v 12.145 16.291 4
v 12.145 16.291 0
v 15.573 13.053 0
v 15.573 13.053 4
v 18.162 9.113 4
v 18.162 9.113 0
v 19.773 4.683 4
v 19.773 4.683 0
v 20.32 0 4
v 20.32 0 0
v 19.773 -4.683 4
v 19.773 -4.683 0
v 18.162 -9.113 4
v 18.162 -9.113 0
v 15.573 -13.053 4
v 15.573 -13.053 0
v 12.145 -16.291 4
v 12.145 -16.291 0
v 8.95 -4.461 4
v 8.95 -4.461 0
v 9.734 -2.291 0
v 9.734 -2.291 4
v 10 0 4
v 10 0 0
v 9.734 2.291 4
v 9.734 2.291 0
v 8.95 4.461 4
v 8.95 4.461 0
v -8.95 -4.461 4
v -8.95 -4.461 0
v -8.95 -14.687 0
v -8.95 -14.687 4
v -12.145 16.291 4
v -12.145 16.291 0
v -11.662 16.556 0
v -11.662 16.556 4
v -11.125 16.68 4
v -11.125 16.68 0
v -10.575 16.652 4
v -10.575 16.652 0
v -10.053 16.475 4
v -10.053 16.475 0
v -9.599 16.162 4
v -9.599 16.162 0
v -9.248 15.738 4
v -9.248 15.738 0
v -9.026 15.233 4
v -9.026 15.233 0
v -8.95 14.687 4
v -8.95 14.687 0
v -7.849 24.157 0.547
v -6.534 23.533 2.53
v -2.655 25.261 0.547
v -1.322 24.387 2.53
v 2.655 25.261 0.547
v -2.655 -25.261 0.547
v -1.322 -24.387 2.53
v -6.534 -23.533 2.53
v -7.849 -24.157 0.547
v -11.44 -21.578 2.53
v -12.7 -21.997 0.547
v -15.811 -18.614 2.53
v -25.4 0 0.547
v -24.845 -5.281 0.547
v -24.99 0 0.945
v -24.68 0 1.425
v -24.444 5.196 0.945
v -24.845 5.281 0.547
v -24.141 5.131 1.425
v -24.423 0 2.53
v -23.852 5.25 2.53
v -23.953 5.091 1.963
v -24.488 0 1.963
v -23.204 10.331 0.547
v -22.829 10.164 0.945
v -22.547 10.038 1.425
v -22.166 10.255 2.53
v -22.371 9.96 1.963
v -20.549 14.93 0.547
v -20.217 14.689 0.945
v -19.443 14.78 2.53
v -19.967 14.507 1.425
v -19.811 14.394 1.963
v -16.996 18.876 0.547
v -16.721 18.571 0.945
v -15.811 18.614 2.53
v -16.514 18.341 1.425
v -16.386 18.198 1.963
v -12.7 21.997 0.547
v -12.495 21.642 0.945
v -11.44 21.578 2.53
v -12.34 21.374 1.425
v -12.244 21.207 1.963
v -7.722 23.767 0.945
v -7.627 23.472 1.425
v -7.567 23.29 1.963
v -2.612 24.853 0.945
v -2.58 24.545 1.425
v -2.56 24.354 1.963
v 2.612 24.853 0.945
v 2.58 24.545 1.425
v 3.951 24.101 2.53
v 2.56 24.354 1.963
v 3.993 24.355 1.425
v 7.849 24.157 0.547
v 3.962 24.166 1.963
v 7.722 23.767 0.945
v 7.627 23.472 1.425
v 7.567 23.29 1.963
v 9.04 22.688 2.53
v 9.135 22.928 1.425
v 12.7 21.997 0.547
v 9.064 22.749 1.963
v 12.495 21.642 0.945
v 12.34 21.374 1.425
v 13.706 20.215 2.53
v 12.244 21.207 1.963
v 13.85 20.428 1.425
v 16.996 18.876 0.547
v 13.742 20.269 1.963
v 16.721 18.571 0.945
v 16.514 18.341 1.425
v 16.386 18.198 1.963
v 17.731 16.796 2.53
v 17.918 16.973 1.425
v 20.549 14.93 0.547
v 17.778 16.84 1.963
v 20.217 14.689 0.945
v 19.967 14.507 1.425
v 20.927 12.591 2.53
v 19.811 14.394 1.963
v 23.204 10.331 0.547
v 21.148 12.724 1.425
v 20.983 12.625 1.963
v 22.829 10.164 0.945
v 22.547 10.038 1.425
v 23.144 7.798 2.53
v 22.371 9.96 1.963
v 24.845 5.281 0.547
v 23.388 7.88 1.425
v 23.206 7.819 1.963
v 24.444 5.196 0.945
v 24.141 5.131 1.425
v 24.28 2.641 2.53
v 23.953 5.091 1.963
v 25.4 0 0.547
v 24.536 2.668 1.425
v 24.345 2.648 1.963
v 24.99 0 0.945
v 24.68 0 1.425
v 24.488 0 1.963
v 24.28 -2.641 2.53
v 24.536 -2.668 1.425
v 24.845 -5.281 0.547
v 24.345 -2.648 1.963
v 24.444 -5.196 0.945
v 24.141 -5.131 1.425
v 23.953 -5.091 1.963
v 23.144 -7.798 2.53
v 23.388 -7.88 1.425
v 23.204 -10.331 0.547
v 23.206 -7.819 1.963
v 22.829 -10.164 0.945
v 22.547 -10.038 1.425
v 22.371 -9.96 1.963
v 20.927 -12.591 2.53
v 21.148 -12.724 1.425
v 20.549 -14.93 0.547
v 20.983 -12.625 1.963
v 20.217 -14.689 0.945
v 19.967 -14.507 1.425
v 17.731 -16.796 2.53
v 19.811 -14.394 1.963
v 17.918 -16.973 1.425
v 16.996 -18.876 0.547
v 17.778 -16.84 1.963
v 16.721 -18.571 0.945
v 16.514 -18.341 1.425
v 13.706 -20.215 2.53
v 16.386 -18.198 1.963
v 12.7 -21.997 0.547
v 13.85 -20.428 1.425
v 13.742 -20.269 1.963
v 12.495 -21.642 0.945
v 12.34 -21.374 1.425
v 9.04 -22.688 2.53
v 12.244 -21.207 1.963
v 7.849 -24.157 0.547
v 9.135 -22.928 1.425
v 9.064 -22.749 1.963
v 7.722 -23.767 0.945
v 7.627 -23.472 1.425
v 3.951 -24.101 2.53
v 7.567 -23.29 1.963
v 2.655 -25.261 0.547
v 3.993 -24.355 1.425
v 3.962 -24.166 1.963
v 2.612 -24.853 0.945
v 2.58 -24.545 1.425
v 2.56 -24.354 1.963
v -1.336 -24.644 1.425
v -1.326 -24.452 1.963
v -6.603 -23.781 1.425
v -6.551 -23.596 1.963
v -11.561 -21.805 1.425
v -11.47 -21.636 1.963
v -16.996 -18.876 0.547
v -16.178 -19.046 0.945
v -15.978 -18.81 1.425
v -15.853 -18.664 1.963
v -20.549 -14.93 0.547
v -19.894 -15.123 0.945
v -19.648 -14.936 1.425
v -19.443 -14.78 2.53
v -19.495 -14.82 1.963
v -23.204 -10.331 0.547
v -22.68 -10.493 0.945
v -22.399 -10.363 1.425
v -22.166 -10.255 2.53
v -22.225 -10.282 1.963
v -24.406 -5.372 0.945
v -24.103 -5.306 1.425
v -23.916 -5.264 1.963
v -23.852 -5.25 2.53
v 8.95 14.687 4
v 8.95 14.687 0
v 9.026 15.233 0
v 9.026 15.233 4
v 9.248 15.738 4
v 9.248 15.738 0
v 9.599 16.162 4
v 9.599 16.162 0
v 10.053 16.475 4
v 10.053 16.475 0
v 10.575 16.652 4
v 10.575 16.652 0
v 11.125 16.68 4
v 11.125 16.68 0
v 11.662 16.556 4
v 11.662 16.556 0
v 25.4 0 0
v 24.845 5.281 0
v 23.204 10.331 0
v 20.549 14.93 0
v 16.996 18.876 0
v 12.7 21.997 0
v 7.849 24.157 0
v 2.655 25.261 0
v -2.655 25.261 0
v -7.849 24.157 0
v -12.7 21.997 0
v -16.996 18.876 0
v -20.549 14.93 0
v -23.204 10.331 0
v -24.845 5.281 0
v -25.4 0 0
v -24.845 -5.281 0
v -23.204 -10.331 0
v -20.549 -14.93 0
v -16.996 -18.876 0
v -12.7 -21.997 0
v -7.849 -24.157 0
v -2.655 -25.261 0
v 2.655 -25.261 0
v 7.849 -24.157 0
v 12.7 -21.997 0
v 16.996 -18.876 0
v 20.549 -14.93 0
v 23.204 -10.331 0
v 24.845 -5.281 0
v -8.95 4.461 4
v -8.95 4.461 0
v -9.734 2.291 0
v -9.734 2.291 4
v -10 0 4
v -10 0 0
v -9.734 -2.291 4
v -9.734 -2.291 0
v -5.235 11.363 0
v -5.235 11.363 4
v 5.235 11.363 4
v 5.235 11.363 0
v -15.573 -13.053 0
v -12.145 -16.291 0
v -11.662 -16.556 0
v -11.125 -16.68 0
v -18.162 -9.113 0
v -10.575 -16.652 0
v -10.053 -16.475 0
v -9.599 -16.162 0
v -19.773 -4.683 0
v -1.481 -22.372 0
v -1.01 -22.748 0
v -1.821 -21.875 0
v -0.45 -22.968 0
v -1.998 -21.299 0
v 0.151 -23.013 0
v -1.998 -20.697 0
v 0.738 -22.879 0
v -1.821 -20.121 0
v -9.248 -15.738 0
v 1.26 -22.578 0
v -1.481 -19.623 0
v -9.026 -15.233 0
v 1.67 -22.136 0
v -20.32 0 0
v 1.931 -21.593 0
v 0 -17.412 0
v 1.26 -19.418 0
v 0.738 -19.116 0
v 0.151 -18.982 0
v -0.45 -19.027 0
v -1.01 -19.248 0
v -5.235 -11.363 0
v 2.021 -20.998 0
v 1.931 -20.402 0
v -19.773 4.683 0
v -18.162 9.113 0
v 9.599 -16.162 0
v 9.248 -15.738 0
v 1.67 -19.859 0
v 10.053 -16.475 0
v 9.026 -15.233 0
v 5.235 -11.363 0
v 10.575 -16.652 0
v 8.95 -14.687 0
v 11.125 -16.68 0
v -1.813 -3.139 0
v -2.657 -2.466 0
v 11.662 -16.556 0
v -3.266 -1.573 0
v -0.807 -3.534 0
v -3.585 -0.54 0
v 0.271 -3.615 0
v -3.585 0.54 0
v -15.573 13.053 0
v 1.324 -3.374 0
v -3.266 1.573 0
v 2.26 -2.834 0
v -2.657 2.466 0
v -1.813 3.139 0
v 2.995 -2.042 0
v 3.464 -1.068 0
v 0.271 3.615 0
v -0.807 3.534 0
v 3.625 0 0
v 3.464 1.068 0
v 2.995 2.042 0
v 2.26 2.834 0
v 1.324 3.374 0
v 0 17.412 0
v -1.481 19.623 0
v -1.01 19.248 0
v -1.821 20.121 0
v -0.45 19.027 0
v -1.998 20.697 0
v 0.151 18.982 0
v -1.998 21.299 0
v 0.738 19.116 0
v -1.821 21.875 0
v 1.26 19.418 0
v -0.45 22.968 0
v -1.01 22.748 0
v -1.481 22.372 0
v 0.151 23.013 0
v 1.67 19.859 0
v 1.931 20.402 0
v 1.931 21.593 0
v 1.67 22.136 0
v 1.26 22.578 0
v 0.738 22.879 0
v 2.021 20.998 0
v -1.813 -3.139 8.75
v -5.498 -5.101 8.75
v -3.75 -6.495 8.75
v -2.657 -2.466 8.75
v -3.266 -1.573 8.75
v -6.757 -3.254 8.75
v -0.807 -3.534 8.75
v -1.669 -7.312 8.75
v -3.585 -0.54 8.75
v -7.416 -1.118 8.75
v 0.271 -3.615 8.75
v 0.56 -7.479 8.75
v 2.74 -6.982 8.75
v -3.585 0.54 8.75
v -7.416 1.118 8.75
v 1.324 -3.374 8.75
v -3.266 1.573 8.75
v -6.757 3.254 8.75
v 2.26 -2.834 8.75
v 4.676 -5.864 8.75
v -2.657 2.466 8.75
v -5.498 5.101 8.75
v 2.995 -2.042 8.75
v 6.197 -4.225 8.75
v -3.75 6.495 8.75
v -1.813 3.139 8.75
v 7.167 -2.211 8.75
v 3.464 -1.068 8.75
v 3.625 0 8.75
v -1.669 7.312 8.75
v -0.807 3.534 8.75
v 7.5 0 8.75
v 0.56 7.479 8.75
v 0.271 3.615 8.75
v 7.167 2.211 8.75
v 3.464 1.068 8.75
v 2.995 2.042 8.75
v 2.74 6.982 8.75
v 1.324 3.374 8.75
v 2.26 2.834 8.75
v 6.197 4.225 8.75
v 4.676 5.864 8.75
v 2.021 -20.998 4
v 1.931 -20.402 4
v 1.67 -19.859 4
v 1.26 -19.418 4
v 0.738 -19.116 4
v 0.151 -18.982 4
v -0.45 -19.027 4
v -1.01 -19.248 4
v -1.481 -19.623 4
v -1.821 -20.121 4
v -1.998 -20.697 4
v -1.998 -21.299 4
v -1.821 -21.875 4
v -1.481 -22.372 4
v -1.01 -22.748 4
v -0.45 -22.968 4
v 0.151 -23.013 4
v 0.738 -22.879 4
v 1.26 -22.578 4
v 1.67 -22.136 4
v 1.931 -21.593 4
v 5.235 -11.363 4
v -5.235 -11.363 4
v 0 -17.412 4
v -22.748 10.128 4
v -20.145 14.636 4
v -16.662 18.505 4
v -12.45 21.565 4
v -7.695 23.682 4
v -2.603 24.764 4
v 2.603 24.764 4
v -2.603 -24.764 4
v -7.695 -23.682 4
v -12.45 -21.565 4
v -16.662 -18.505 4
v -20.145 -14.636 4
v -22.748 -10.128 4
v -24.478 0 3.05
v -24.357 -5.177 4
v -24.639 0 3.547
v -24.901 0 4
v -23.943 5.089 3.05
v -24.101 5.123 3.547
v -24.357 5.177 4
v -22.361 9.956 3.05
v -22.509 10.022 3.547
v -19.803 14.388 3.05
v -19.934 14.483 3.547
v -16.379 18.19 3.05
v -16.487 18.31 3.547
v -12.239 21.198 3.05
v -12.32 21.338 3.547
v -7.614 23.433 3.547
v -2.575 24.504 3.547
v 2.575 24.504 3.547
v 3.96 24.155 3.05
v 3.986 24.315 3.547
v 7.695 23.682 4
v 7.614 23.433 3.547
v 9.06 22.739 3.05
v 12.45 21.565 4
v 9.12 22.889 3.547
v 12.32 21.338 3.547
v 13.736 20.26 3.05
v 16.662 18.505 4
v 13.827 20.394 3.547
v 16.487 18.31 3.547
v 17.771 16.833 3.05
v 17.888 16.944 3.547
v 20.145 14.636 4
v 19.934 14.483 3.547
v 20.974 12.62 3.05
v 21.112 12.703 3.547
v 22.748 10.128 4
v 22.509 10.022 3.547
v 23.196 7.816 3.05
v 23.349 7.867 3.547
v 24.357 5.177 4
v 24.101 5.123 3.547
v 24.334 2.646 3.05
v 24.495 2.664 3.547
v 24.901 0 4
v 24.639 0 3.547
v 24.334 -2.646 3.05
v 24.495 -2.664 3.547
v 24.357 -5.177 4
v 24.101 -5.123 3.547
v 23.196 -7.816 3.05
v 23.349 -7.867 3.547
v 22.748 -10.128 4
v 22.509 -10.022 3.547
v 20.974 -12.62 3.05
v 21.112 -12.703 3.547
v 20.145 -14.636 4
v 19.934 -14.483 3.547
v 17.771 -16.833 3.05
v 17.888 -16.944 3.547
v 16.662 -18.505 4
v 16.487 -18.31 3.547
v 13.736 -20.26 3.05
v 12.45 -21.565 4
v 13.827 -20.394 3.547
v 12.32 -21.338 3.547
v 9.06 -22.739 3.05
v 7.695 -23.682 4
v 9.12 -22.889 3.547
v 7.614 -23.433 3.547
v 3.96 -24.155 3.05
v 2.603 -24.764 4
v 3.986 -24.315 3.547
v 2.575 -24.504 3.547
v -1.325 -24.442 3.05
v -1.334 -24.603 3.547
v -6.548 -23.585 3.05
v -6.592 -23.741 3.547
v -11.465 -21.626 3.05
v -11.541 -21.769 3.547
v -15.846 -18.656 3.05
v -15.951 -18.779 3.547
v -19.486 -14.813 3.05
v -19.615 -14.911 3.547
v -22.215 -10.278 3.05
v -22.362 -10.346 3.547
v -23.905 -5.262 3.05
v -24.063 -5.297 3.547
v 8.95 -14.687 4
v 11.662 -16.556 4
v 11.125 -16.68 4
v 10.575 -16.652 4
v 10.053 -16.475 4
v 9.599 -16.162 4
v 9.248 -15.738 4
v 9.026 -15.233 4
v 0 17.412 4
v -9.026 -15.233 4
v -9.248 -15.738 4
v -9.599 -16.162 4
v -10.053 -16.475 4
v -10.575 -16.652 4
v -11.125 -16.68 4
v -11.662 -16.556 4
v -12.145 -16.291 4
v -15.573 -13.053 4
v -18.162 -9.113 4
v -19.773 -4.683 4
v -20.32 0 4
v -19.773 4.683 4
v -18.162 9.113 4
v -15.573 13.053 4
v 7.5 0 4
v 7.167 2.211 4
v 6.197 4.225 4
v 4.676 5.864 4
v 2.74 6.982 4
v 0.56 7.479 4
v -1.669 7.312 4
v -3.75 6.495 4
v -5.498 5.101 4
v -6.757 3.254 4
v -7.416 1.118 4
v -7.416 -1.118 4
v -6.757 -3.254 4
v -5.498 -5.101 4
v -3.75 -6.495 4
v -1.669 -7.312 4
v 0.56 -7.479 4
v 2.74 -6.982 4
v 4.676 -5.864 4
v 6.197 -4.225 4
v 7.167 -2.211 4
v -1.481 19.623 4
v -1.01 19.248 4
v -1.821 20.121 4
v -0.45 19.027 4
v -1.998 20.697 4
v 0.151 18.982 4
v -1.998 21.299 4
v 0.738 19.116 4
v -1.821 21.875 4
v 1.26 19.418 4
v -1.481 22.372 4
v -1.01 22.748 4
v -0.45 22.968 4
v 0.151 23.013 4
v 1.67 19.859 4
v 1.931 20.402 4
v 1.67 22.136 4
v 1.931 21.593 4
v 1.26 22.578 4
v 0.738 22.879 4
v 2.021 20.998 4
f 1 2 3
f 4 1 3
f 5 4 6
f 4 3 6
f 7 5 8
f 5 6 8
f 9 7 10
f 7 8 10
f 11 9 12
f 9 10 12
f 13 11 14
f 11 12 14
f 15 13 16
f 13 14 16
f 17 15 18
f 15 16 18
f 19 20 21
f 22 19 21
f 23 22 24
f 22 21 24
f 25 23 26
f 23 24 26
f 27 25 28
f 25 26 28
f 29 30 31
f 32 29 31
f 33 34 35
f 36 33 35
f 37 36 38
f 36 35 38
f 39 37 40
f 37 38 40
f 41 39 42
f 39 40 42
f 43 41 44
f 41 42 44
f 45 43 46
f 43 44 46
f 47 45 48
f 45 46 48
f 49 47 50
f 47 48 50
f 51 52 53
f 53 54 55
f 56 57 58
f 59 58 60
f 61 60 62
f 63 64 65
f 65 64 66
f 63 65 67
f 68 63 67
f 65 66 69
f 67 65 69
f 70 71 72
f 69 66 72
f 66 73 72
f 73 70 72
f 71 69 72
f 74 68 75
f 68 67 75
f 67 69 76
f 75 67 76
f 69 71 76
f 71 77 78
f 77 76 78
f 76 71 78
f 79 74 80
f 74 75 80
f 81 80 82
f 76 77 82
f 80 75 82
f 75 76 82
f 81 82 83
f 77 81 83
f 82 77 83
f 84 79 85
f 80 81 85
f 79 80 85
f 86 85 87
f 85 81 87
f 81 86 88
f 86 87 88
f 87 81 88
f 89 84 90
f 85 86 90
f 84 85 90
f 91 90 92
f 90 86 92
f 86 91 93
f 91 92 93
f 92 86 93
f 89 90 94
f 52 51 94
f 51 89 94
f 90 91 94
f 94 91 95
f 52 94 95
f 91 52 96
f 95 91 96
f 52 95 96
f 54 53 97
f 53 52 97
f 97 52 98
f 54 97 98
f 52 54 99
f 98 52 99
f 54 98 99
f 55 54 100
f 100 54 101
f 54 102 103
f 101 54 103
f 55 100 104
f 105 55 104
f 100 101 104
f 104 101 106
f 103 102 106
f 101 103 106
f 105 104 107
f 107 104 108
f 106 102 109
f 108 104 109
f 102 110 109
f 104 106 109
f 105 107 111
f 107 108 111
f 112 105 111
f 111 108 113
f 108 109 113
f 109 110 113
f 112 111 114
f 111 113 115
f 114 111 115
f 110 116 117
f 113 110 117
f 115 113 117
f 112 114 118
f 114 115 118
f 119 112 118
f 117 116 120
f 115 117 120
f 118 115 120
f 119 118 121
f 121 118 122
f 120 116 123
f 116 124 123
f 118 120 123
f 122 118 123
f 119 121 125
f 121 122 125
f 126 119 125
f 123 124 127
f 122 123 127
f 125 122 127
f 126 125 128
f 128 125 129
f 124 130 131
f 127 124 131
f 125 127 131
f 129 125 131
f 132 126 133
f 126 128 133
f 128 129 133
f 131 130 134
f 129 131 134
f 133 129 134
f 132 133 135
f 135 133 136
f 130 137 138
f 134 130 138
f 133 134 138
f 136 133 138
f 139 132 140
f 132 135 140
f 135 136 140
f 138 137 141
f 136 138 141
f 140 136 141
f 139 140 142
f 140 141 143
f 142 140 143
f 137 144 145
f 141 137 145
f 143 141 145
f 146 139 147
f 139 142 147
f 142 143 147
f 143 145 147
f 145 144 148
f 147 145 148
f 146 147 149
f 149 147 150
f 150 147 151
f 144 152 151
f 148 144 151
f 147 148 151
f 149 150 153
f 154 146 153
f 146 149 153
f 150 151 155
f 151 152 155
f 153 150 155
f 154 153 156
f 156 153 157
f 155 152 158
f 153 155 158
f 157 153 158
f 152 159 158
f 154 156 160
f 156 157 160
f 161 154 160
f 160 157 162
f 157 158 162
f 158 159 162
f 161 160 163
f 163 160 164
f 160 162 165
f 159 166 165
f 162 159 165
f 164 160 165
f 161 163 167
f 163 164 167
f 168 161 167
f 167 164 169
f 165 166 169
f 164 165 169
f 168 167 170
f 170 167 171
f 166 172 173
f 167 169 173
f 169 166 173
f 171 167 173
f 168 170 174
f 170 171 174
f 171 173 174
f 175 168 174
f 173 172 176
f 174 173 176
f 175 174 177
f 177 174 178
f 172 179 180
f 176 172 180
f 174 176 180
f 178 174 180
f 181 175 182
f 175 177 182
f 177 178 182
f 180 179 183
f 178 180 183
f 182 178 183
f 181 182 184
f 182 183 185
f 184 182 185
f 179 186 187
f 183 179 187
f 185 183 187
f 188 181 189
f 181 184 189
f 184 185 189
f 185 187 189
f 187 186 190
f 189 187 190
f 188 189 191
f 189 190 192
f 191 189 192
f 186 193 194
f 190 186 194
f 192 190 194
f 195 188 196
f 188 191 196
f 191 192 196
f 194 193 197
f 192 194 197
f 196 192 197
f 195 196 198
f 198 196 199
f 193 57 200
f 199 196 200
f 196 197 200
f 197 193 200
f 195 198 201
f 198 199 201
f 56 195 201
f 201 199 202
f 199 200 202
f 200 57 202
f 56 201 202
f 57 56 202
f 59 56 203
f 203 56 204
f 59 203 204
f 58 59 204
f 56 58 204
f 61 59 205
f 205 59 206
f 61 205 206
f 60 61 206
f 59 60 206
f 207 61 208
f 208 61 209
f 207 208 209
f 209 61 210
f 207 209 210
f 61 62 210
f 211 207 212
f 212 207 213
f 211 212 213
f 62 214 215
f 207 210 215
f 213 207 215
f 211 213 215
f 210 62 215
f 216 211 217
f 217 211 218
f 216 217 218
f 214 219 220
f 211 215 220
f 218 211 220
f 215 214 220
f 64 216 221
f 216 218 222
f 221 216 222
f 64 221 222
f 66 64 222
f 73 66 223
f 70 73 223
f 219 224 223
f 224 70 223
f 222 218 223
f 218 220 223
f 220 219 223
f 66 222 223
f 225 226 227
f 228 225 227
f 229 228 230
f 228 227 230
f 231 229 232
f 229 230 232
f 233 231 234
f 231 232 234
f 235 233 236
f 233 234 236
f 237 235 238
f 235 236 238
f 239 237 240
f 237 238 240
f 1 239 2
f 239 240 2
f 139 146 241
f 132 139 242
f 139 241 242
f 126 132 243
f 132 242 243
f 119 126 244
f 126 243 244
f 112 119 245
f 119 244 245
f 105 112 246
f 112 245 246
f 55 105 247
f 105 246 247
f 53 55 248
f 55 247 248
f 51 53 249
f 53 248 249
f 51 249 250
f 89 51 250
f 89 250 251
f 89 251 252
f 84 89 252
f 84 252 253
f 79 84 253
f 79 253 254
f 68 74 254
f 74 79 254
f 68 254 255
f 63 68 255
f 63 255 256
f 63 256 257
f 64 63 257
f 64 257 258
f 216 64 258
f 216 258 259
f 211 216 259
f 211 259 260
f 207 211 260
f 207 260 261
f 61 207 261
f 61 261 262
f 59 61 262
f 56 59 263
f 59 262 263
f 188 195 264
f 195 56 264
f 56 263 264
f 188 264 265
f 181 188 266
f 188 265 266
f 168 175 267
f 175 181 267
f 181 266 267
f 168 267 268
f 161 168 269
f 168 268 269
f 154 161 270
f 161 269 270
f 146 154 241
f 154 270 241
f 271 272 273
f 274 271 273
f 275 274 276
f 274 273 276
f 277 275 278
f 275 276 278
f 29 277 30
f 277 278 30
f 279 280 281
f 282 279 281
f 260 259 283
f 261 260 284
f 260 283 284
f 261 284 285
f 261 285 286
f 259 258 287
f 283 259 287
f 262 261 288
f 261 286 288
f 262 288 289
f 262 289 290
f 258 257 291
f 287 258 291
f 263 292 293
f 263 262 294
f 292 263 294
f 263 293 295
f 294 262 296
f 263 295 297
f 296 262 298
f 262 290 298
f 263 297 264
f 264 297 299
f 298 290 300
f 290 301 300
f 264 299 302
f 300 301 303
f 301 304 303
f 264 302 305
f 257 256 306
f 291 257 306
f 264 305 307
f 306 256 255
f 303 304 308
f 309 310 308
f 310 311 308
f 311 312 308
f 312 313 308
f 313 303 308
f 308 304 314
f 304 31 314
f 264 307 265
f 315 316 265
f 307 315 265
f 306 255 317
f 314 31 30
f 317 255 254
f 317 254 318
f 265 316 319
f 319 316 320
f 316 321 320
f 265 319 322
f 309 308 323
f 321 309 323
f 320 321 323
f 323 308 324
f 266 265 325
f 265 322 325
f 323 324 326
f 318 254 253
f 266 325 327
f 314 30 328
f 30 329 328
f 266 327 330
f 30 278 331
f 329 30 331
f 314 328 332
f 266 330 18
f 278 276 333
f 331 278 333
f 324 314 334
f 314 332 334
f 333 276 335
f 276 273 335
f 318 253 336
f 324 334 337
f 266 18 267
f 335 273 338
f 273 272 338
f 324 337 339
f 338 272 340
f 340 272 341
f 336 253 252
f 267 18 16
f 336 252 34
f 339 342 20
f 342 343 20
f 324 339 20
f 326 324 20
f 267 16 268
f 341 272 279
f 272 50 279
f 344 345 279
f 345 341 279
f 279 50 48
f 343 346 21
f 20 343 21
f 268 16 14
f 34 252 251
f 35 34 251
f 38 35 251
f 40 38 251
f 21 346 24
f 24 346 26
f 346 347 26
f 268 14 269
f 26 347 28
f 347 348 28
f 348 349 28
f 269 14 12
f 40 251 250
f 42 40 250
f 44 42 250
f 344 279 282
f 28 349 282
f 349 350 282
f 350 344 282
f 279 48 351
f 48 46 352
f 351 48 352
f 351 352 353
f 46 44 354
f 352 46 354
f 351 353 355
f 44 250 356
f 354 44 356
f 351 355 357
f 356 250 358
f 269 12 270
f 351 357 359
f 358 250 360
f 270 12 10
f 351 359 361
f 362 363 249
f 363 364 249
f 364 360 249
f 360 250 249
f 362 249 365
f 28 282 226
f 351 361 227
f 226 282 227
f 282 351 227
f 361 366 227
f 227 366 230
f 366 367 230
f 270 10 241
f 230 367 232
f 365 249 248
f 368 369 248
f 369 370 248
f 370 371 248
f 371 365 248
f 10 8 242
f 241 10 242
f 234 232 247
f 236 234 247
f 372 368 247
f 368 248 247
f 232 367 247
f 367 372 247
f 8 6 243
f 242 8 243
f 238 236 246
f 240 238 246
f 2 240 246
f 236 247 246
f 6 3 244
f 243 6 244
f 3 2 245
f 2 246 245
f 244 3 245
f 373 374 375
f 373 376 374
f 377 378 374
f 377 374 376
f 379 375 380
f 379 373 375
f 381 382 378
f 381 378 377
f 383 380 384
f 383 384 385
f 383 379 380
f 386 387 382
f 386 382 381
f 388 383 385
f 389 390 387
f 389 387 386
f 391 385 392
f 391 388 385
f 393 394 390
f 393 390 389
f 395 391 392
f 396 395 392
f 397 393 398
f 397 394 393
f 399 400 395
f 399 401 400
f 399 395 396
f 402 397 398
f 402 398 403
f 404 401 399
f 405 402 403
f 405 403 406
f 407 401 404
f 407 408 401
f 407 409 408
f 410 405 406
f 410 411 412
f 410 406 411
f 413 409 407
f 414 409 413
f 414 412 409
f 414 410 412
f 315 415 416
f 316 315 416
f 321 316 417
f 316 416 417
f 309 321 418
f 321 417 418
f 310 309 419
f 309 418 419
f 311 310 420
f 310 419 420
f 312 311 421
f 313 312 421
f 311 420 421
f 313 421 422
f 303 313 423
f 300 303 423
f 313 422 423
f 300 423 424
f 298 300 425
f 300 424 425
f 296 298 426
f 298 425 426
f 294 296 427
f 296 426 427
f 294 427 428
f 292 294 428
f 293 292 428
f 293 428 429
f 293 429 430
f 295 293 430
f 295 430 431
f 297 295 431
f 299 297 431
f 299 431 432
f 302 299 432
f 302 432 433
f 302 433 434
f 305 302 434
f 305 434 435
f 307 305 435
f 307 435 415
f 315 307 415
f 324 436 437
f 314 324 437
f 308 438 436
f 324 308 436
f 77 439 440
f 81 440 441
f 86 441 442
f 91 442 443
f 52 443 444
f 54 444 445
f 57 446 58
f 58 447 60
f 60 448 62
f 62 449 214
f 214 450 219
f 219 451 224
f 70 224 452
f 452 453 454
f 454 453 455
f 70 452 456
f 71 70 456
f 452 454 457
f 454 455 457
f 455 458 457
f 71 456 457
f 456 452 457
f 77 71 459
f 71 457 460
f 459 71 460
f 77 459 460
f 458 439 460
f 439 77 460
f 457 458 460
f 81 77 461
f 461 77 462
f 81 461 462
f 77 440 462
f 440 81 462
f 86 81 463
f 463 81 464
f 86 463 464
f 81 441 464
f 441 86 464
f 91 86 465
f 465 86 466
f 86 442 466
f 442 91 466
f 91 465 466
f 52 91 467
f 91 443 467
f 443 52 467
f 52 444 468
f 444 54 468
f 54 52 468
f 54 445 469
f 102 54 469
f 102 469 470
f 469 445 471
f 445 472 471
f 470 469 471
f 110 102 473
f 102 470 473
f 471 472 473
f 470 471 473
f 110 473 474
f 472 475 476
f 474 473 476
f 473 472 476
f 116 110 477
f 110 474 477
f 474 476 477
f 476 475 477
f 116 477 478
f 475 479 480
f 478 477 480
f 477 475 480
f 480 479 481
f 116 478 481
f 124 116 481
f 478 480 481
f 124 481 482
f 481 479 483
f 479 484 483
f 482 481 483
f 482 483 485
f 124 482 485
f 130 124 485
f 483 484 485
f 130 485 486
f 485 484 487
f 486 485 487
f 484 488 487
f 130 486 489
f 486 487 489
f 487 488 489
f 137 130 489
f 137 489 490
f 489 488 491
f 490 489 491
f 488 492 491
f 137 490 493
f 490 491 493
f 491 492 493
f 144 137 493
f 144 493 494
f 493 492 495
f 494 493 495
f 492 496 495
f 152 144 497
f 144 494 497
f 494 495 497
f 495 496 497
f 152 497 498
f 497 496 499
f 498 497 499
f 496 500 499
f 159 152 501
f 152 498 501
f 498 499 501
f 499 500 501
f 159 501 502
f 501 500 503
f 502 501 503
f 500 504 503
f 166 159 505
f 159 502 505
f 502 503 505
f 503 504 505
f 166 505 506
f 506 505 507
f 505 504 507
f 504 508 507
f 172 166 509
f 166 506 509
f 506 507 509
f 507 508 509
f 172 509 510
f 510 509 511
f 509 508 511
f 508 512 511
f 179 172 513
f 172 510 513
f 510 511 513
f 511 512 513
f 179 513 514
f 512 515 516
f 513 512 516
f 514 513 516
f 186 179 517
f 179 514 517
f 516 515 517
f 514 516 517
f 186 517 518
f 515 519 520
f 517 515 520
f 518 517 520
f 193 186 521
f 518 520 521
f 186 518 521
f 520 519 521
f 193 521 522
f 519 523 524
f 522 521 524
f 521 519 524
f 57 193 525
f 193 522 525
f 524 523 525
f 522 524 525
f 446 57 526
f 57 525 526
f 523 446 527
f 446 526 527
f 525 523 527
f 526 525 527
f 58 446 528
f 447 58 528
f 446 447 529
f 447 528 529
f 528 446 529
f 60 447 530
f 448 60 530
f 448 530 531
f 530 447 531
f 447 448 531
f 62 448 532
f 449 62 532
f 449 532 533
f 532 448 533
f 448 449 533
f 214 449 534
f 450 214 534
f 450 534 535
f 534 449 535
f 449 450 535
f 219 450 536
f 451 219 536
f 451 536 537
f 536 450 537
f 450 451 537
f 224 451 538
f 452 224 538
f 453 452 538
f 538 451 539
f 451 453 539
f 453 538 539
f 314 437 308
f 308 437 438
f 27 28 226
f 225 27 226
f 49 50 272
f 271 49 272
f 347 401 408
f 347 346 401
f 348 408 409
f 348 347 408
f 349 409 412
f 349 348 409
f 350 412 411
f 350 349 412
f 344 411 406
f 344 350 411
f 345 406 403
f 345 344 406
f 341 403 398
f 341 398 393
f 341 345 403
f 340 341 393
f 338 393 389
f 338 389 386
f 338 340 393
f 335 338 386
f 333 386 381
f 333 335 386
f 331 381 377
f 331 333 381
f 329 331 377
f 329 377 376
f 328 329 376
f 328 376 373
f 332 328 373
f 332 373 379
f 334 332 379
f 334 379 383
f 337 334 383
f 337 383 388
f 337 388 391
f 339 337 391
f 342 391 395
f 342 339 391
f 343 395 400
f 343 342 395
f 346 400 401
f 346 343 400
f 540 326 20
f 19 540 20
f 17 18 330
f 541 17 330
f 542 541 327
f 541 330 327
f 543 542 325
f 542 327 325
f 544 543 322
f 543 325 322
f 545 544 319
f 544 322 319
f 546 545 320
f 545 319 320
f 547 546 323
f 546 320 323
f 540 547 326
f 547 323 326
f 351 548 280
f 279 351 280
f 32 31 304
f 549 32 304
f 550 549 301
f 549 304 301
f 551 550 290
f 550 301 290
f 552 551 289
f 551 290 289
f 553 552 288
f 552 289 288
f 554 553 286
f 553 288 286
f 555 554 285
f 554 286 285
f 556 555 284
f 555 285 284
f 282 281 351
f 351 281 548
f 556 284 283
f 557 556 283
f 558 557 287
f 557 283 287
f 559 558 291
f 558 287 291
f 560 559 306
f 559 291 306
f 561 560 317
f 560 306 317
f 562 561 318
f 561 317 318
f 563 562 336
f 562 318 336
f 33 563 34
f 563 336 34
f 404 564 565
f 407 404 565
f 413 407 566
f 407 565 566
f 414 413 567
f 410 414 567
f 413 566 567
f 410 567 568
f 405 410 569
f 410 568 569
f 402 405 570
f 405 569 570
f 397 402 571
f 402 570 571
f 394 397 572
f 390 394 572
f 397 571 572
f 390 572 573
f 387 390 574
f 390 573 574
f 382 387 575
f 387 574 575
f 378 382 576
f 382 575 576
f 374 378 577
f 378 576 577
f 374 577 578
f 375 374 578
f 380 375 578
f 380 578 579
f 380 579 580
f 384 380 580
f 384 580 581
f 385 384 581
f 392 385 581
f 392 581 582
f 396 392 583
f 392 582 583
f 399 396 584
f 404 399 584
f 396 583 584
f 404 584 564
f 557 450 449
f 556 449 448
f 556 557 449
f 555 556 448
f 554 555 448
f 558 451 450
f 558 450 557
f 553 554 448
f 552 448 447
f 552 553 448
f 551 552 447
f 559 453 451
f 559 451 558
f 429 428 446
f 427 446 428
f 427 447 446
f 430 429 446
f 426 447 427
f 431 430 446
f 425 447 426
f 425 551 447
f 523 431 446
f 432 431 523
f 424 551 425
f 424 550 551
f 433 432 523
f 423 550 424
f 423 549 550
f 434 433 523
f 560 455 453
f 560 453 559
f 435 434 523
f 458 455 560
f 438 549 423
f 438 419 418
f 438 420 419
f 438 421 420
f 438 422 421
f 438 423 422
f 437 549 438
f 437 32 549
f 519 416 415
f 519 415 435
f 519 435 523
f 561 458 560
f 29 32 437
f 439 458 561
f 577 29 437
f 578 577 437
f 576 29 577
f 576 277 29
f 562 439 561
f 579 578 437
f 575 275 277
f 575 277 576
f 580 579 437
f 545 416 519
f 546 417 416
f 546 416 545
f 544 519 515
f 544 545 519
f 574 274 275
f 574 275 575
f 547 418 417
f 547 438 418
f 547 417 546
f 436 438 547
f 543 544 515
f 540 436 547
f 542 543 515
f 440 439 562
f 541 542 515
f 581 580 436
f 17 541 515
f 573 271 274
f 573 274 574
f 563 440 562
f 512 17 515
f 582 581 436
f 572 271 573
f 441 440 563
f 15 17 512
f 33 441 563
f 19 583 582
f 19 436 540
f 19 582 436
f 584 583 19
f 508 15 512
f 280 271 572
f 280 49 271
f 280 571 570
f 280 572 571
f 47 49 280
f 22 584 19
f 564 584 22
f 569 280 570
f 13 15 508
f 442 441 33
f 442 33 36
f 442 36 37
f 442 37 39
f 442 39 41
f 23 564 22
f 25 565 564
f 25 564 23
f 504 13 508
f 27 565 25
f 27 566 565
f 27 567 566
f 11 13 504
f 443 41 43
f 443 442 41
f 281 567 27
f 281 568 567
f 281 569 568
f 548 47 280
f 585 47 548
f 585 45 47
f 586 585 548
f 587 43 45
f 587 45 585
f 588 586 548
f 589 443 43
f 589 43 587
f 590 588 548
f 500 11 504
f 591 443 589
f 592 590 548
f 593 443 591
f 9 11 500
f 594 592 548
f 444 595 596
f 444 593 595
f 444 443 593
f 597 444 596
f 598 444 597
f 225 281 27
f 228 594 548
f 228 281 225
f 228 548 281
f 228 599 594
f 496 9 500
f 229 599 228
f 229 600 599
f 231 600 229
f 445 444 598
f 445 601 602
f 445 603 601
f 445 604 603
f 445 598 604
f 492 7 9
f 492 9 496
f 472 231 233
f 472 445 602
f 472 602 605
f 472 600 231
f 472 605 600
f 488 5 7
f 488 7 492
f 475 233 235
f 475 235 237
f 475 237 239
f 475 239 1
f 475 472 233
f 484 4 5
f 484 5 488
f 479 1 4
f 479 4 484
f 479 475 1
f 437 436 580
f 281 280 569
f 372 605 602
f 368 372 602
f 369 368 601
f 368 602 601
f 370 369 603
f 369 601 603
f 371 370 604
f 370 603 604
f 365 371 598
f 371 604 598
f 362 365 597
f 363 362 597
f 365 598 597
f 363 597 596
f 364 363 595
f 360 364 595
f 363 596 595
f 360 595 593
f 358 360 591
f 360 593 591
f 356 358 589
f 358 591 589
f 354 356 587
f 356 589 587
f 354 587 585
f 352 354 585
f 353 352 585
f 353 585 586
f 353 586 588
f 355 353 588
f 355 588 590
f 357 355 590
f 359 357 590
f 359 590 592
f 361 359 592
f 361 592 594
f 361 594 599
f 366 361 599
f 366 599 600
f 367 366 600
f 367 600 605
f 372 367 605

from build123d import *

# Parameters (mm, degrees)
F0_R     = 25.4
F0_R_2   = 3.625
F1_DEPTH = 4
F2_R     = 7.5
F2_R_2   = 3.625
F3_DEPTH = 4.75
F4_R     = 2.020962
F5_DEPTH = 4.001
F6_R     = 2.5


with BuildPart() as f1:
    # F0 (on Top) → F1 (new body)
    with BuildSketch(Plane.XY):
        Circle(F0_R)
        with BuildLine():
            Line((-8.950036, 14.687379), (-8.950036, 4.46059))
            ThreePointArc((-8.950036, 4.46059), (-10, 0), (-8.950036, -4.46059))
            Line((-8.950036, -4.46059), (-8.950036, -14.687379))
            ThreePointArc((-8.950036, -14.687379), (-10.053051, -16.474953), (-12.145455, -16.290805))
            ThreePointArc((-12.145455, -16.290805), (-20.32, 0), (-12.145455, 16.290805))
            ThreePointArc((-12.145455, 16.290805), (-10.053051, 16.474953), (-8.950036, 14.687379))
        make_face(mode=Mode.SUBTRACT)
        Circle(F0_R_2, mode=Mode.SUBTRACT)
        with BuildLine():
            Line((8.950036, 4.46059), (8.950036, 14.687379))
            ThreePointArc((8.950036, 14.687379), (10.053051, 16.474953), (12.145455, 16.290805))
            ThreePointArc((12.145455, 16.290805), (20.32, 0), (12.145455, -16.290805))
            ThreePointArc((12.145455, -16.290805), (10.053051, -16.474953), (8.950036, -14.687379))
            Line((8.950036, -14.687379), (8.950036, -4.46059))
            ThreePointArc((8.950036, -4.46059), (10, 0), (8.950036, 4.46059))
        make_face(mode=Mode.SUBTRACT)
    extrude(amount=F1_DEPTH)

    # F2 (on face) → F3 (join)
    with BuildSketch(Plane.XY.offset(4)):
        Circle(F2_R)
        Circle(F2_R_2, mode=Mode.SUBTRACT)
    extrude(amount=F3_DEPTH)

    # F4 (on face) → F5 (cut, through all)
    with BuildSketch(Plane.XY.offset(4)):
        Polygon((-5.234685, 11.362989), (0, 11.362989), (0, 17.41166), align=None)
        Polygon((0, 17.41166), (0, 11.362989), (5.234685, 11.362989), align=None)
        Polygon((0, -11.362989), (-5.234685, -11.362989), (0, -17.41166), (5.234685, -11.362989), align=None)
        with Locations((0, 20.997725)):
            Circle(F4_R)
        with Locations((0, -20.997725)):
            Circle(F4_R)
    extrude(amount=-F5_DEPTH, mode=Mode.SUBTRACT)

    # F6 (on Front) → F7 (revolve, cut)
    with BuildSketch(Plane.XZ):
        with Locations((-26.922889, 2.530067)):
            Circle(F6_R)
    revolve(axis=Axis((0, 0, 7.021954), (0, 0, -1)), mode=Mode.SUBTRACT)


solid = f1.part
